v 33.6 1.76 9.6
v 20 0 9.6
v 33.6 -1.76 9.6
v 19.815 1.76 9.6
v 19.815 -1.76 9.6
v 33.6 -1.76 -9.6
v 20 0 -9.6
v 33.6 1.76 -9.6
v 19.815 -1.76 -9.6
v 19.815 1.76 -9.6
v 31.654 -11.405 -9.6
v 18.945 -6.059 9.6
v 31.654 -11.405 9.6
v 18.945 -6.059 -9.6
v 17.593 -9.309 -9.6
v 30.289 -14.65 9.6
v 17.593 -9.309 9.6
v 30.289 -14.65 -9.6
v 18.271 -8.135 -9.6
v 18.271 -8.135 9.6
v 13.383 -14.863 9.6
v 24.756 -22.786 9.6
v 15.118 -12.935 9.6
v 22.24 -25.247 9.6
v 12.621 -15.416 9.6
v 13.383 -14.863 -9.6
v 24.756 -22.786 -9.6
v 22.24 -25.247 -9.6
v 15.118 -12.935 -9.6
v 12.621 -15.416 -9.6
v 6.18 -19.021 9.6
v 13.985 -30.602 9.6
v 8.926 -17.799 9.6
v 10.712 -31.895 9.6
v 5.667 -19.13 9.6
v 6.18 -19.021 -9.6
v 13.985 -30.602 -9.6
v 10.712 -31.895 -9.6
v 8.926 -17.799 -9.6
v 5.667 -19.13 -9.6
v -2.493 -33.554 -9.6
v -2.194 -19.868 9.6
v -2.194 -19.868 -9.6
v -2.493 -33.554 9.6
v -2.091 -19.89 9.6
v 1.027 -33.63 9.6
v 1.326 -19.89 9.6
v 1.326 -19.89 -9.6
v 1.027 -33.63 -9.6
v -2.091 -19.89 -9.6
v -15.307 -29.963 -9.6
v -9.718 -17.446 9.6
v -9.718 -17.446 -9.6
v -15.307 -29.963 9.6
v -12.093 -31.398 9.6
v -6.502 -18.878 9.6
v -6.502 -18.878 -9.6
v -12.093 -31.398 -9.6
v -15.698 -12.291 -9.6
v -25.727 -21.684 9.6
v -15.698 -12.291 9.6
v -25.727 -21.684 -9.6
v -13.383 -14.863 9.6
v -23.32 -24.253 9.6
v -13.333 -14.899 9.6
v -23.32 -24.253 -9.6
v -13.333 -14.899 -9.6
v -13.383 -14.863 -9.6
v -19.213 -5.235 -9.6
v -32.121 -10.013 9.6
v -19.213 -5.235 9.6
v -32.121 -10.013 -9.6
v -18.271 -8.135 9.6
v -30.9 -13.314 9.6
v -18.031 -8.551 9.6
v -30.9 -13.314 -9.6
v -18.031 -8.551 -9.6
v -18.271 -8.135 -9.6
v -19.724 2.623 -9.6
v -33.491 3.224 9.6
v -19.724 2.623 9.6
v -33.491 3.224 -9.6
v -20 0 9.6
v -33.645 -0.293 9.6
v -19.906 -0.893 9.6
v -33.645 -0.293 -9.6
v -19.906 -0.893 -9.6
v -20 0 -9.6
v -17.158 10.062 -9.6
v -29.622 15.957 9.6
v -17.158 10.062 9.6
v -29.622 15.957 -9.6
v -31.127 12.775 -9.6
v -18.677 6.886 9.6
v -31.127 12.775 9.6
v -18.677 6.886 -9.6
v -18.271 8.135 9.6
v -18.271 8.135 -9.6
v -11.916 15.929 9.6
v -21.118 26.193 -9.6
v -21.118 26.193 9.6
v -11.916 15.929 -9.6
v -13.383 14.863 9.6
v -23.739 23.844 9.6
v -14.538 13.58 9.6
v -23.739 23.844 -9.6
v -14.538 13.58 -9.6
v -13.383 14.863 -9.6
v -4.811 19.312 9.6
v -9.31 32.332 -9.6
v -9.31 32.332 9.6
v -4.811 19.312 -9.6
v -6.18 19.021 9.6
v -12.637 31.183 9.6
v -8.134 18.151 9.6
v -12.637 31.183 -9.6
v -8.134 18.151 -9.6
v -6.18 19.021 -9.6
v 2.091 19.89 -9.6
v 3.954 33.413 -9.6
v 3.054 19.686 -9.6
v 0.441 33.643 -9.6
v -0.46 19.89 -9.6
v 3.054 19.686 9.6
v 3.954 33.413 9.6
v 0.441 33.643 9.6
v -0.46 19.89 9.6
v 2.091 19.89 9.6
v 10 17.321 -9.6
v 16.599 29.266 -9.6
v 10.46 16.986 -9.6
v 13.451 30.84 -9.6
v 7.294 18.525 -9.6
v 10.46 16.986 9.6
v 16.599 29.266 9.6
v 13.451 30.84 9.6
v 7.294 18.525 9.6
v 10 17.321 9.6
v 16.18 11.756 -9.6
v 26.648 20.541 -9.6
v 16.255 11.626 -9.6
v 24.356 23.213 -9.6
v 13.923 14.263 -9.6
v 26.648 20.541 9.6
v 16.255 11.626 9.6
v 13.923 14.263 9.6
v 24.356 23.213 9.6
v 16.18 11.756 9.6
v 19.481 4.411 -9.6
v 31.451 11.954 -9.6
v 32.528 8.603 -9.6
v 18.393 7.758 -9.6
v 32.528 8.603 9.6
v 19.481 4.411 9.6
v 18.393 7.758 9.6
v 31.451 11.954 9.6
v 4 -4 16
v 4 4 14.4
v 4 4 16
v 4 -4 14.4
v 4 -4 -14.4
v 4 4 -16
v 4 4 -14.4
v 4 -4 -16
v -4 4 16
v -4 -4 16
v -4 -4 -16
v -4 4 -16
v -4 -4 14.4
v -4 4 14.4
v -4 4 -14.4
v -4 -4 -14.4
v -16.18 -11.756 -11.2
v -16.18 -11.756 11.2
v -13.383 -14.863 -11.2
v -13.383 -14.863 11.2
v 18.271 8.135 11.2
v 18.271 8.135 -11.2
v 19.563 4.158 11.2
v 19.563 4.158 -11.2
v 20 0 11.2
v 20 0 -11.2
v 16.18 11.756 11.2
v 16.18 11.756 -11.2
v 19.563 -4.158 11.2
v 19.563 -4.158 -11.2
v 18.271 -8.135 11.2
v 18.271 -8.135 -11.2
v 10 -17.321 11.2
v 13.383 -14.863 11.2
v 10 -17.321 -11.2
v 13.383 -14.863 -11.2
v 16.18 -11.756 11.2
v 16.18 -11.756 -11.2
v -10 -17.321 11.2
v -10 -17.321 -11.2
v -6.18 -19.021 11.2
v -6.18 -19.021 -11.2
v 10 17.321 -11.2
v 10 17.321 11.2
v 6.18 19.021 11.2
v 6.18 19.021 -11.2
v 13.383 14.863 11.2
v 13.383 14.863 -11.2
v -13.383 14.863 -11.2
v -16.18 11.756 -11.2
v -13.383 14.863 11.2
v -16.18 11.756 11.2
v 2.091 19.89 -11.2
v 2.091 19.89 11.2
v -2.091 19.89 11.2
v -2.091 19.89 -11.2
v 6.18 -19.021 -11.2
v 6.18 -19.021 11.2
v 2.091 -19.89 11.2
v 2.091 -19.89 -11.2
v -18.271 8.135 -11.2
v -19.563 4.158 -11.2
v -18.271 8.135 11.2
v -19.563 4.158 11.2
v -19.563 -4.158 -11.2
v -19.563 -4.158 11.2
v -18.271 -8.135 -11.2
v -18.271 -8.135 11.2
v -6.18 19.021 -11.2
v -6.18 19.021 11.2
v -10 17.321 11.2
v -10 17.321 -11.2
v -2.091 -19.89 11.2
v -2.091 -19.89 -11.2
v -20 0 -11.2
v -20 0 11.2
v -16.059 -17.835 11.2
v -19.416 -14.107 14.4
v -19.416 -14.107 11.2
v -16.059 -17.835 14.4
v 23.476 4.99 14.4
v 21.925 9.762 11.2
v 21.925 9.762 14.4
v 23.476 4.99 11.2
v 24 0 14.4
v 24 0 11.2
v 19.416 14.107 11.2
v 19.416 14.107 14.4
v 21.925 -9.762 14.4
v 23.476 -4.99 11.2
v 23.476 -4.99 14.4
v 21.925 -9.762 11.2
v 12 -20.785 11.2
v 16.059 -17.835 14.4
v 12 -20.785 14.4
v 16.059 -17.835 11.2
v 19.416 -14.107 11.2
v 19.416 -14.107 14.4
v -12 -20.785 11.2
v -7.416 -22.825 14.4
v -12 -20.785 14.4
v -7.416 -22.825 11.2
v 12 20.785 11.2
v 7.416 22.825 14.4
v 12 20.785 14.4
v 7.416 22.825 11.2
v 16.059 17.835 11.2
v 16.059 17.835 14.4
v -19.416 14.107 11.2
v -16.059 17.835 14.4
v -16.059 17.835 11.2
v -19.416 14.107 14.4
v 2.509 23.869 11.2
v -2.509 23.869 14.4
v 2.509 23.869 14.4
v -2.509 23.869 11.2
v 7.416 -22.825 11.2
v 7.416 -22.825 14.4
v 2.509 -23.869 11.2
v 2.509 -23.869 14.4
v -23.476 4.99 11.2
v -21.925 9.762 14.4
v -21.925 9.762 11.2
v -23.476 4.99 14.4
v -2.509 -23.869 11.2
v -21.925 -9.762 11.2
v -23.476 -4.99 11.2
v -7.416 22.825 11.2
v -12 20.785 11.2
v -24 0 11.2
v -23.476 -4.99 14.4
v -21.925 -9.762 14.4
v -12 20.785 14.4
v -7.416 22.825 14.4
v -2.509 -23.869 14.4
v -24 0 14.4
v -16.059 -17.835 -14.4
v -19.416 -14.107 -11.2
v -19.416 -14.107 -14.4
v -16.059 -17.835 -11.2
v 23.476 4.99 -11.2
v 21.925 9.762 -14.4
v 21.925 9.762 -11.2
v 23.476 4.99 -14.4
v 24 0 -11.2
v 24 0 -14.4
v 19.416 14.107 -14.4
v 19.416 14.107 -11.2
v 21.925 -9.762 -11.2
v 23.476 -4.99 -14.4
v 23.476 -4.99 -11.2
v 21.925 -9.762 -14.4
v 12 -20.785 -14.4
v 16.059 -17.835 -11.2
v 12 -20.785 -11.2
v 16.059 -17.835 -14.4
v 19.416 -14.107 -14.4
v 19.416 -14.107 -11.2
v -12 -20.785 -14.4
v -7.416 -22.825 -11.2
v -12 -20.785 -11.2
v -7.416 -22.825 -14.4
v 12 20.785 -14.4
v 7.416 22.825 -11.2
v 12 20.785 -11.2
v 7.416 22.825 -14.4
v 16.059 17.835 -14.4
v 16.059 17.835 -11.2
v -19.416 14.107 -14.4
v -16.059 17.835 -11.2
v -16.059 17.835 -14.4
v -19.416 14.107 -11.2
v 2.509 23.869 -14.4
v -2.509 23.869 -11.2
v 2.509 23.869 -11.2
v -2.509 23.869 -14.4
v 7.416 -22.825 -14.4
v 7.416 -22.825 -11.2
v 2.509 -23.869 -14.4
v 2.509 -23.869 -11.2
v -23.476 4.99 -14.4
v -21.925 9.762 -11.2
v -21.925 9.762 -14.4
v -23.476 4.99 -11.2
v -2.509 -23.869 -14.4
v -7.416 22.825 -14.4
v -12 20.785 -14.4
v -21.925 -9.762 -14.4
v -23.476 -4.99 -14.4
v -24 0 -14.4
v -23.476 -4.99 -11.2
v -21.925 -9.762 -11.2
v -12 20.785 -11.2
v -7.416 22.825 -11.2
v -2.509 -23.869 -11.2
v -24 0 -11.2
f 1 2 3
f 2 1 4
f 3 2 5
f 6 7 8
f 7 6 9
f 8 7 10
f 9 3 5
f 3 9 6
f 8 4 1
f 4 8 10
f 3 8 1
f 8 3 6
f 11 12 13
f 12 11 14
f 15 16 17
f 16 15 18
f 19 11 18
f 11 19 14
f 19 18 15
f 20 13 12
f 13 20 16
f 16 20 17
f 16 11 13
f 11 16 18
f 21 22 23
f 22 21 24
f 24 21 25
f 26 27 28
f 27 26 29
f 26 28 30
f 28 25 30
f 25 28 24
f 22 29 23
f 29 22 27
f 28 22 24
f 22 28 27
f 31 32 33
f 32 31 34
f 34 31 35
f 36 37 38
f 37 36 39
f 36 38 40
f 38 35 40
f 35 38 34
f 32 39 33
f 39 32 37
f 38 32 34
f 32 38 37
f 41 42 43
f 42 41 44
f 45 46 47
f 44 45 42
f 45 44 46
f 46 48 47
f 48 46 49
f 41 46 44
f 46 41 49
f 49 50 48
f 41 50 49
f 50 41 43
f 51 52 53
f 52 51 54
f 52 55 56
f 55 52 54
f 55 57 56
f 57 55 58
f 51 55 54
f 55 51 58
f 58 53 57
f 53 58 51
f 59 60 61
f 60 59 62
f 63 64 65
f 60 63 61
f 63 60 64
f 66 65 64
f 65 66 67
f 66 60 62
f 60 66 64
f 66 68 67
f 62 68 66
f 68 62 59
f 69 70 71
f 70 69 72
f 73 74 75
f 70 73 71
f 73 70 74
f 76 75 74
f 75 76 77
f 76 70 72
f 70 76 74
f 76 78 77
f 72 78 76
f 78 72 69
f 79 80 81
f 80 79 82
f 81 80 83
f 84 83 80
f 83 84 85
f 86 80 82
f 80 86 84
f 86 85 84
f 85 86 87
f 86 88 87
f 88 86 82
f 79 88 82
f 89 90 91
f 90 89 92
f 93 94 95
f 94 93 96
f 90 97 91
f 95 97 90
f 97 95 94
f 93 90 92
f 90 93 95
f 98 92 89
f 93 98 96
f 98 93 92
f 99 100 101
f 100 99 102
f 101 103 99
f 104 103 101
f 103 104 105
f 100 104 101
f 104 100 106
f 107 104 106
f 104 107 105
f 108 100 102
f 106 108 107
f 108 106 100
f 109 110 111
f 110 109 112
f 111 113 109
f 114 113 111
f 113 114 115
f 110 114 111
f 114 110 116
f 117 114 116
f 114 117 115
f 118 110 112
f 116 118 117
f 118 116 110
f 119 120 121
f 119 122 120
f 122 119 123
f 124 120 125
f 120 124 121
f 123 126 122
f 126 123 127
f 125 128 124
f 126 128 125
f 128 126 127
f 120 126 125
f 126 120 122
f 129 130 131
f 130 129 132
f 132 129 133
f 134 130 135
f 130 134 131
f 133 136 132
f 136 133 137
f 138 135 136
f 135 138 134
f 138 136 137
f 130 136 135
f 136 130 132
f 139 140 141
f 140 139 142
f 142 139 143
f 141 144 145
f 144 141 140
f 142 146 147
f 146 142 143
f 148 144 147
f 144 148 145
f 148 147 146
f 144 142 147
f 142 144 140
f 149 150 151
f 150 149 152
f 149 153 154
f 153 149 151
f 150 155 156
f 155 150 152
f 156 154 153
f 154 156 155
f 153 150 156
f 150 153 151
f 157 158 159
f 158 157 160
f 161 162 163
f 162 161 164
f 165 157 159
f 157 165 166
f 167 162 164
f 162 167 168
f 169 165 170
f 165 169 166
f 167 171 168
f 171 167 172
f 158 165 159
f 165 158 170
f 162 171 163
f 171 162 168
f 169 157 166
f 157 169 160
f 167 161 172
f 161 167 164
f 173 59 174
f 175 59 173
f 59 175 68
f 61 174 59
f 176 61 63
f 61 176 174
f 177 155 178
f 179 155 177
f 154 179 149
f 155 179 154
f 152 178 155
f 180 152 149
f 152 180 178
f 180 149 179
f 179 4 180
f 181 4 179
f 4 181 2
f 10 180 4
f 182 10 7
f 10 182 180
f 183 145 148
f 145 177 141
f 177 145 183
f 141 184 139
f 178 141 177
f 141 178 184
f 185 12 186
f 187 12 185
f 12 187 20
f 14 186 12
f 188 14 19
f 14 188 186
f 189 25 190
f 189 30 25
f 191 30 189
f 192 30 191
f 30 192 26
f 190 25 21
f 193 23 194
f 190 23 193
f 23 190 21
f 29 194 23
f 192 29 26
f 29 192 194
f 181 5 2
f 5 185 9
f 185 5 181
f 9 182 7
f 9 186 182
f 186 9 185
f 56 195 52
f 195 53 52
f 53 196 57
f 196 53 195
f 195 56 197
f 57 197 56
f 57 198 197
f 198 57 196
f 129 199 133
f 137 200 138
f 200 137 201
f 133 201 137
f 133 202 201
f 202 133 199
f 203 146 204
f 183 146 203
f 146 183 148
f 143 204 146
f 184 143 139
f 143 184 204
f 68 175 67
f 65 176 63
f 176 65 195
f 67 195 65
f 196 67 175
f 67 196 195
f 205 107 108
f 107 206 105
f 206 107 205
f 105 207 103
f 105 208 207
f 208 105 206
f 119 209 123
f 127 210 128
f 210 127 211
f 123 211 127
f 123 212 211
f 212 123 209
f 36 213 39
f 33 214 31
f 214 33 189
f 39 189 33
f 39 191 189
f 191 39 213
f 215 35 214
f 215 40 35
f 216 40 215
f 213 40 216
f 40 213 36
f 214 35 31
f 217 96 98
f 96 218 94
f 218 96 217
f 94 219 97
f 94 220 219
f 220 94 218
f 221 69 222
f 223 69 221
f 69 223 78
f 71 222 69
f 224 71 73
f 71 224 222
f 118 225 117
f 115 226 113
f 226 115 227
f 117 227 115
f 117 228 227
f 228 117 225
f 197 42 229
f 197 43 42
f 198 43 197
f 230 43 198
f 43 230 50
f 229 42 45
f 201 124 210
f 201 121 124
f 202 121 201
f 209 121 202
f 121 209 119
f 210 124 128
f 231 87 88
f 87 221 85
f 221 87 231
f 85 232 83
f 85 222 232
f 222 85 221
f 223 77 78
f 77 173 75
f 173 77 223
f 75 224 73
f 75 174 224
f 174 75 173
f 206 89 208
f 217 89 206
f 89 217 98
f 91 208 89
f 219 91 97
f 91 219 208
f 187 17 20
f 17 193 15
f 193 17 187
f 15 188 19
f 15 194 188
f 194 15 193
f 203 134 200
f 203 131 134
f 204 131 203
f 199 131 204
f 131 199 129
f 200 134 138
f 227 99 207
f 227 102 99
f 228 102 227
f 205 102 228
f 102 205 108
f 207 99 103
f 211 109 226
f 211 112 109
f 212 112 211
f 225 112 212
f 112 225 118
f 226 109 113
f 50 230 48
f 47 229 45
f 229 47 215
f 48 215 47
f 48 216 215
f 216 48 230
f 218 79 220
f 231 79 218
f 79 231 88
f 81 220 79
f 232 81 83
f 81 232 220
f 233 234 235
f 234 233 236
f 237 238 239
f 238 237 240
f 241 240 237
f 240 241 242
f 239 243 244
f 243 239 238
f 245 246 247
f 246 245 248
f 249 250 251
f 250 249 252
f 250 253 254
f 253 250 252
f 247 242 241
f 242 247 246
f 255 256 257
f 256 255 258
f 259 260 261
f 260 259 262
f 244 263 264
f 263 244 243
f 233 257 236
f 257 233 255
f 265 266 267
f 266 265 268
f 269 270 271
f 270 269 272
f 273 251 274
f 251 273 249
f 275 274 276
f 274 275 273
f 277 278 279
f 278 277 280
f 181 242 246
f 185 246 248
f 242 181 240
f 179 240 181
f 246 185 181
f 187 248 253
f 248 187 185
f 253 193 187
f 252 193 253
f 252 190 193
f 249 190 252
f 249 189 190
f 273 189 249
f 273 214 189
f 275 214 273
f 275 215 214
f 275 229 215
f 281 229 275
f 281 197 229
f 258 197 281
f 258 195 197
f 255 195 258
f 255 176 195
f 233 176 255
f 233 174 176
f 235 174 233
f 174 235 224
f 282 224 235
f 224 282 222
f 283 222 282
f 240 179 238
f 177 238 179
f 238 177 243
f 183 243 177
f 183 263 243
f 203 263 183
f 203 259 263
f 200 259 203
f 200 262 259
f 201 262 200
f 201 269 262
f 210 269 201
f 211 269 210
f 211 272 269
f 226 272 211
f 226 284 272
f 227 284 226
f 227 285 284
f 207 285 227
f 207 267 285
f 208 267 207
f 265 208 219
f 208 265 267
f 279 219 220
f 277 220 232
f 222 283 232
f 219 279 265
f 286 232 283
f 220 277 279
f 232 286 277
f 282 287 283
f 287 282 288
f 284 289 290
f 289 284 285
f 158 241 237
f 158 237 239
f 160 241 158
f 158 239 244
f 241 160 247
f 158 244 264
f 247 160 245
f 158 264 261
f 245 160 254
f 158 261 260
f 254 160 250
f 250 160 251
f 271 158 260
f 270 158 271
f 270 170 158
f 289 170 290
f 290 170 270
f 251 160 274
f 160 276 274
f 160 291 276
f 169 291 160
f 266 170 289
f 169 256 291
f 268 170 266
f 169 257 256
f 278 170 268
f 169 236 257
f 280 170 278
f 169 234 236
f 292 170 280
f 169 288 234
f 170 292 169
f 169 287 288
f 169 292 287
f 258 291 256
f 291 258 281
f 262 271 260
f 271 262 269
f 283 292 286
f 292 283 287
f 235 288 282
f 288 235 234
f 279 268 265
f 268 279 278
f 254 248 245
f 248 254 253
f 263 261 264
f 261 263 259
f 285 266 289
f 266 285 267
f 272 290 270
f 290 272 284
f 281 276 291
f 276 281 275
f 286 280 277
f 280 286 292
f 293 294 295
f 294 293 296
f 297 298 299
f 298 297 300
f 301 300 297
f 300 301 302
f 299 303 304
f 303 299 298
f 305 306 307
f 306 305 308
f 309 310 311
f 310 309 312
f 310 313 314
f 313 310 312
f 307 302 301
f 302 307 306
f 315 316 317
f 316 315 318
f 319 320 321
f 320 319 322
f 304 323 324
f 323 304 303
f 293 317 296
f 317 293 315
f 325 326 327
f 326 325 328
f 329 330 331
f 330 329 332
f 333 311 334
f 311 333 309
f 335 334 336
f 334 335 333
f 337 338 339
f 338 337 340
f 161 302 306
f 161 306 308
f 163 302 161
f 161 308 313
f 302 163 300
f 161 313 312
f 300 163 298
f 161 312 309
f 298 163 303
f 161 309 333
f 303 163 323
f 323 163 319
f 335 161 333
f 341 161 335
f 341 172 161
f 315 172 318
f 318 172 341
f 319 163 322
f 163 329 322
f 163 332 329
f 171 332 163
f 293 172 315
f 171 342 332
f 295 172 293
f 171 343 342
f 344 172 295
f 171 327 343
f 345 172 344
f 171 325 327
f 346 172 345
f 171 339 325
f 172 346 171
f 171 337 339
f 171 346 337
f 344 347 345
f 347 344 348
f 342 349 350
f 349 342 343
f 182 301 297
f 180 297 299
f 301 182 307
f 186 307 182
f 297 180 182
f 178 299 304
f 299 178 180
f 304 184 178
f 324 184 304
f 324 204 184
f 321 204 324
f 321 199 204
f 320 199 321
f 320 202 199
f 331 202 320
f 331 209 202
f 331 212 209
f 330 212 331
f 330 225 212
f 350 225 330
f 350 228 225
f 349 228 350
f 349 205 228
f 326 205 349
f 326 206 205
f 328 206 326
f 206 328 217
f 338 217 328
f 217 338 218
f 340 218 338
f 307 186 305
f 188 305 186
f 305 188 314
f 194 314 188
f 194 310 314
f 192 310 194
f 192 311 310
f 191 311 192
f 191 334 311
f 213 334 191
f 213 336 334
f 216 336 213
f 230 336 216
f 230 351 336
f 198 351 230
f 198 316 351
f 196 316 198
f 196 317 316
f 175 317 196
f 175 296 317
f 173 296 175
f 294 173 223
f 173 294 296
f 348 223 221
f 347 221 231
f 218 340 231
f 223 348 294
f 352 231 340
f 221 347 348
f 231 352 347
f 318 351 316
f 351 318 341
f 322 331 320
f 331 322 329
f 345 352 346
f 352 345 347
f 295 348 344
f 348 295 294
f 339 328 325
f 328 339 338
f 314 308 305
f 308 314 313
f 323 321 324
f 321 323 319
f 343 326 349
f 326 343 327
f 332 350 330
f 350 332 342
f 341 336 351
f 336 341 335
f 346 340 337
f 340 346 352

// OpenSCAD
size = 32;//block=32 //item=8


cube([size * 0.25, size * 0.25, size * 1], center = true);//shaft

cylinder(h = size * 0.8, d = size * 1.25, center = true);//center

translate([0, 0, size * 0.4]) {
  cylinder(h = size * 0.1, d = size * 1.5, center = true);//ringTop
}
;//translate

translate([0, 0, -size * 0.4]) {
  cylinder(h = size * 0.1, d = size * 1.5, center = true);//ringTop
}
;//translate


union() {
  count = 16;
  for(i = [0:1:count - 1]) {
    rotate([365 / count * i, 90, 0]) {
      translate([0, 0, size * 0.8]) {
        rotate([90, 0, 0]) {
          cube([size * 0.6, size * 0.5, size * 0.11], center = true);
        }
        ;//rotate
      }
      ;//translate
    }
    ;//rotate
  }
  ;//for
}
;//union
